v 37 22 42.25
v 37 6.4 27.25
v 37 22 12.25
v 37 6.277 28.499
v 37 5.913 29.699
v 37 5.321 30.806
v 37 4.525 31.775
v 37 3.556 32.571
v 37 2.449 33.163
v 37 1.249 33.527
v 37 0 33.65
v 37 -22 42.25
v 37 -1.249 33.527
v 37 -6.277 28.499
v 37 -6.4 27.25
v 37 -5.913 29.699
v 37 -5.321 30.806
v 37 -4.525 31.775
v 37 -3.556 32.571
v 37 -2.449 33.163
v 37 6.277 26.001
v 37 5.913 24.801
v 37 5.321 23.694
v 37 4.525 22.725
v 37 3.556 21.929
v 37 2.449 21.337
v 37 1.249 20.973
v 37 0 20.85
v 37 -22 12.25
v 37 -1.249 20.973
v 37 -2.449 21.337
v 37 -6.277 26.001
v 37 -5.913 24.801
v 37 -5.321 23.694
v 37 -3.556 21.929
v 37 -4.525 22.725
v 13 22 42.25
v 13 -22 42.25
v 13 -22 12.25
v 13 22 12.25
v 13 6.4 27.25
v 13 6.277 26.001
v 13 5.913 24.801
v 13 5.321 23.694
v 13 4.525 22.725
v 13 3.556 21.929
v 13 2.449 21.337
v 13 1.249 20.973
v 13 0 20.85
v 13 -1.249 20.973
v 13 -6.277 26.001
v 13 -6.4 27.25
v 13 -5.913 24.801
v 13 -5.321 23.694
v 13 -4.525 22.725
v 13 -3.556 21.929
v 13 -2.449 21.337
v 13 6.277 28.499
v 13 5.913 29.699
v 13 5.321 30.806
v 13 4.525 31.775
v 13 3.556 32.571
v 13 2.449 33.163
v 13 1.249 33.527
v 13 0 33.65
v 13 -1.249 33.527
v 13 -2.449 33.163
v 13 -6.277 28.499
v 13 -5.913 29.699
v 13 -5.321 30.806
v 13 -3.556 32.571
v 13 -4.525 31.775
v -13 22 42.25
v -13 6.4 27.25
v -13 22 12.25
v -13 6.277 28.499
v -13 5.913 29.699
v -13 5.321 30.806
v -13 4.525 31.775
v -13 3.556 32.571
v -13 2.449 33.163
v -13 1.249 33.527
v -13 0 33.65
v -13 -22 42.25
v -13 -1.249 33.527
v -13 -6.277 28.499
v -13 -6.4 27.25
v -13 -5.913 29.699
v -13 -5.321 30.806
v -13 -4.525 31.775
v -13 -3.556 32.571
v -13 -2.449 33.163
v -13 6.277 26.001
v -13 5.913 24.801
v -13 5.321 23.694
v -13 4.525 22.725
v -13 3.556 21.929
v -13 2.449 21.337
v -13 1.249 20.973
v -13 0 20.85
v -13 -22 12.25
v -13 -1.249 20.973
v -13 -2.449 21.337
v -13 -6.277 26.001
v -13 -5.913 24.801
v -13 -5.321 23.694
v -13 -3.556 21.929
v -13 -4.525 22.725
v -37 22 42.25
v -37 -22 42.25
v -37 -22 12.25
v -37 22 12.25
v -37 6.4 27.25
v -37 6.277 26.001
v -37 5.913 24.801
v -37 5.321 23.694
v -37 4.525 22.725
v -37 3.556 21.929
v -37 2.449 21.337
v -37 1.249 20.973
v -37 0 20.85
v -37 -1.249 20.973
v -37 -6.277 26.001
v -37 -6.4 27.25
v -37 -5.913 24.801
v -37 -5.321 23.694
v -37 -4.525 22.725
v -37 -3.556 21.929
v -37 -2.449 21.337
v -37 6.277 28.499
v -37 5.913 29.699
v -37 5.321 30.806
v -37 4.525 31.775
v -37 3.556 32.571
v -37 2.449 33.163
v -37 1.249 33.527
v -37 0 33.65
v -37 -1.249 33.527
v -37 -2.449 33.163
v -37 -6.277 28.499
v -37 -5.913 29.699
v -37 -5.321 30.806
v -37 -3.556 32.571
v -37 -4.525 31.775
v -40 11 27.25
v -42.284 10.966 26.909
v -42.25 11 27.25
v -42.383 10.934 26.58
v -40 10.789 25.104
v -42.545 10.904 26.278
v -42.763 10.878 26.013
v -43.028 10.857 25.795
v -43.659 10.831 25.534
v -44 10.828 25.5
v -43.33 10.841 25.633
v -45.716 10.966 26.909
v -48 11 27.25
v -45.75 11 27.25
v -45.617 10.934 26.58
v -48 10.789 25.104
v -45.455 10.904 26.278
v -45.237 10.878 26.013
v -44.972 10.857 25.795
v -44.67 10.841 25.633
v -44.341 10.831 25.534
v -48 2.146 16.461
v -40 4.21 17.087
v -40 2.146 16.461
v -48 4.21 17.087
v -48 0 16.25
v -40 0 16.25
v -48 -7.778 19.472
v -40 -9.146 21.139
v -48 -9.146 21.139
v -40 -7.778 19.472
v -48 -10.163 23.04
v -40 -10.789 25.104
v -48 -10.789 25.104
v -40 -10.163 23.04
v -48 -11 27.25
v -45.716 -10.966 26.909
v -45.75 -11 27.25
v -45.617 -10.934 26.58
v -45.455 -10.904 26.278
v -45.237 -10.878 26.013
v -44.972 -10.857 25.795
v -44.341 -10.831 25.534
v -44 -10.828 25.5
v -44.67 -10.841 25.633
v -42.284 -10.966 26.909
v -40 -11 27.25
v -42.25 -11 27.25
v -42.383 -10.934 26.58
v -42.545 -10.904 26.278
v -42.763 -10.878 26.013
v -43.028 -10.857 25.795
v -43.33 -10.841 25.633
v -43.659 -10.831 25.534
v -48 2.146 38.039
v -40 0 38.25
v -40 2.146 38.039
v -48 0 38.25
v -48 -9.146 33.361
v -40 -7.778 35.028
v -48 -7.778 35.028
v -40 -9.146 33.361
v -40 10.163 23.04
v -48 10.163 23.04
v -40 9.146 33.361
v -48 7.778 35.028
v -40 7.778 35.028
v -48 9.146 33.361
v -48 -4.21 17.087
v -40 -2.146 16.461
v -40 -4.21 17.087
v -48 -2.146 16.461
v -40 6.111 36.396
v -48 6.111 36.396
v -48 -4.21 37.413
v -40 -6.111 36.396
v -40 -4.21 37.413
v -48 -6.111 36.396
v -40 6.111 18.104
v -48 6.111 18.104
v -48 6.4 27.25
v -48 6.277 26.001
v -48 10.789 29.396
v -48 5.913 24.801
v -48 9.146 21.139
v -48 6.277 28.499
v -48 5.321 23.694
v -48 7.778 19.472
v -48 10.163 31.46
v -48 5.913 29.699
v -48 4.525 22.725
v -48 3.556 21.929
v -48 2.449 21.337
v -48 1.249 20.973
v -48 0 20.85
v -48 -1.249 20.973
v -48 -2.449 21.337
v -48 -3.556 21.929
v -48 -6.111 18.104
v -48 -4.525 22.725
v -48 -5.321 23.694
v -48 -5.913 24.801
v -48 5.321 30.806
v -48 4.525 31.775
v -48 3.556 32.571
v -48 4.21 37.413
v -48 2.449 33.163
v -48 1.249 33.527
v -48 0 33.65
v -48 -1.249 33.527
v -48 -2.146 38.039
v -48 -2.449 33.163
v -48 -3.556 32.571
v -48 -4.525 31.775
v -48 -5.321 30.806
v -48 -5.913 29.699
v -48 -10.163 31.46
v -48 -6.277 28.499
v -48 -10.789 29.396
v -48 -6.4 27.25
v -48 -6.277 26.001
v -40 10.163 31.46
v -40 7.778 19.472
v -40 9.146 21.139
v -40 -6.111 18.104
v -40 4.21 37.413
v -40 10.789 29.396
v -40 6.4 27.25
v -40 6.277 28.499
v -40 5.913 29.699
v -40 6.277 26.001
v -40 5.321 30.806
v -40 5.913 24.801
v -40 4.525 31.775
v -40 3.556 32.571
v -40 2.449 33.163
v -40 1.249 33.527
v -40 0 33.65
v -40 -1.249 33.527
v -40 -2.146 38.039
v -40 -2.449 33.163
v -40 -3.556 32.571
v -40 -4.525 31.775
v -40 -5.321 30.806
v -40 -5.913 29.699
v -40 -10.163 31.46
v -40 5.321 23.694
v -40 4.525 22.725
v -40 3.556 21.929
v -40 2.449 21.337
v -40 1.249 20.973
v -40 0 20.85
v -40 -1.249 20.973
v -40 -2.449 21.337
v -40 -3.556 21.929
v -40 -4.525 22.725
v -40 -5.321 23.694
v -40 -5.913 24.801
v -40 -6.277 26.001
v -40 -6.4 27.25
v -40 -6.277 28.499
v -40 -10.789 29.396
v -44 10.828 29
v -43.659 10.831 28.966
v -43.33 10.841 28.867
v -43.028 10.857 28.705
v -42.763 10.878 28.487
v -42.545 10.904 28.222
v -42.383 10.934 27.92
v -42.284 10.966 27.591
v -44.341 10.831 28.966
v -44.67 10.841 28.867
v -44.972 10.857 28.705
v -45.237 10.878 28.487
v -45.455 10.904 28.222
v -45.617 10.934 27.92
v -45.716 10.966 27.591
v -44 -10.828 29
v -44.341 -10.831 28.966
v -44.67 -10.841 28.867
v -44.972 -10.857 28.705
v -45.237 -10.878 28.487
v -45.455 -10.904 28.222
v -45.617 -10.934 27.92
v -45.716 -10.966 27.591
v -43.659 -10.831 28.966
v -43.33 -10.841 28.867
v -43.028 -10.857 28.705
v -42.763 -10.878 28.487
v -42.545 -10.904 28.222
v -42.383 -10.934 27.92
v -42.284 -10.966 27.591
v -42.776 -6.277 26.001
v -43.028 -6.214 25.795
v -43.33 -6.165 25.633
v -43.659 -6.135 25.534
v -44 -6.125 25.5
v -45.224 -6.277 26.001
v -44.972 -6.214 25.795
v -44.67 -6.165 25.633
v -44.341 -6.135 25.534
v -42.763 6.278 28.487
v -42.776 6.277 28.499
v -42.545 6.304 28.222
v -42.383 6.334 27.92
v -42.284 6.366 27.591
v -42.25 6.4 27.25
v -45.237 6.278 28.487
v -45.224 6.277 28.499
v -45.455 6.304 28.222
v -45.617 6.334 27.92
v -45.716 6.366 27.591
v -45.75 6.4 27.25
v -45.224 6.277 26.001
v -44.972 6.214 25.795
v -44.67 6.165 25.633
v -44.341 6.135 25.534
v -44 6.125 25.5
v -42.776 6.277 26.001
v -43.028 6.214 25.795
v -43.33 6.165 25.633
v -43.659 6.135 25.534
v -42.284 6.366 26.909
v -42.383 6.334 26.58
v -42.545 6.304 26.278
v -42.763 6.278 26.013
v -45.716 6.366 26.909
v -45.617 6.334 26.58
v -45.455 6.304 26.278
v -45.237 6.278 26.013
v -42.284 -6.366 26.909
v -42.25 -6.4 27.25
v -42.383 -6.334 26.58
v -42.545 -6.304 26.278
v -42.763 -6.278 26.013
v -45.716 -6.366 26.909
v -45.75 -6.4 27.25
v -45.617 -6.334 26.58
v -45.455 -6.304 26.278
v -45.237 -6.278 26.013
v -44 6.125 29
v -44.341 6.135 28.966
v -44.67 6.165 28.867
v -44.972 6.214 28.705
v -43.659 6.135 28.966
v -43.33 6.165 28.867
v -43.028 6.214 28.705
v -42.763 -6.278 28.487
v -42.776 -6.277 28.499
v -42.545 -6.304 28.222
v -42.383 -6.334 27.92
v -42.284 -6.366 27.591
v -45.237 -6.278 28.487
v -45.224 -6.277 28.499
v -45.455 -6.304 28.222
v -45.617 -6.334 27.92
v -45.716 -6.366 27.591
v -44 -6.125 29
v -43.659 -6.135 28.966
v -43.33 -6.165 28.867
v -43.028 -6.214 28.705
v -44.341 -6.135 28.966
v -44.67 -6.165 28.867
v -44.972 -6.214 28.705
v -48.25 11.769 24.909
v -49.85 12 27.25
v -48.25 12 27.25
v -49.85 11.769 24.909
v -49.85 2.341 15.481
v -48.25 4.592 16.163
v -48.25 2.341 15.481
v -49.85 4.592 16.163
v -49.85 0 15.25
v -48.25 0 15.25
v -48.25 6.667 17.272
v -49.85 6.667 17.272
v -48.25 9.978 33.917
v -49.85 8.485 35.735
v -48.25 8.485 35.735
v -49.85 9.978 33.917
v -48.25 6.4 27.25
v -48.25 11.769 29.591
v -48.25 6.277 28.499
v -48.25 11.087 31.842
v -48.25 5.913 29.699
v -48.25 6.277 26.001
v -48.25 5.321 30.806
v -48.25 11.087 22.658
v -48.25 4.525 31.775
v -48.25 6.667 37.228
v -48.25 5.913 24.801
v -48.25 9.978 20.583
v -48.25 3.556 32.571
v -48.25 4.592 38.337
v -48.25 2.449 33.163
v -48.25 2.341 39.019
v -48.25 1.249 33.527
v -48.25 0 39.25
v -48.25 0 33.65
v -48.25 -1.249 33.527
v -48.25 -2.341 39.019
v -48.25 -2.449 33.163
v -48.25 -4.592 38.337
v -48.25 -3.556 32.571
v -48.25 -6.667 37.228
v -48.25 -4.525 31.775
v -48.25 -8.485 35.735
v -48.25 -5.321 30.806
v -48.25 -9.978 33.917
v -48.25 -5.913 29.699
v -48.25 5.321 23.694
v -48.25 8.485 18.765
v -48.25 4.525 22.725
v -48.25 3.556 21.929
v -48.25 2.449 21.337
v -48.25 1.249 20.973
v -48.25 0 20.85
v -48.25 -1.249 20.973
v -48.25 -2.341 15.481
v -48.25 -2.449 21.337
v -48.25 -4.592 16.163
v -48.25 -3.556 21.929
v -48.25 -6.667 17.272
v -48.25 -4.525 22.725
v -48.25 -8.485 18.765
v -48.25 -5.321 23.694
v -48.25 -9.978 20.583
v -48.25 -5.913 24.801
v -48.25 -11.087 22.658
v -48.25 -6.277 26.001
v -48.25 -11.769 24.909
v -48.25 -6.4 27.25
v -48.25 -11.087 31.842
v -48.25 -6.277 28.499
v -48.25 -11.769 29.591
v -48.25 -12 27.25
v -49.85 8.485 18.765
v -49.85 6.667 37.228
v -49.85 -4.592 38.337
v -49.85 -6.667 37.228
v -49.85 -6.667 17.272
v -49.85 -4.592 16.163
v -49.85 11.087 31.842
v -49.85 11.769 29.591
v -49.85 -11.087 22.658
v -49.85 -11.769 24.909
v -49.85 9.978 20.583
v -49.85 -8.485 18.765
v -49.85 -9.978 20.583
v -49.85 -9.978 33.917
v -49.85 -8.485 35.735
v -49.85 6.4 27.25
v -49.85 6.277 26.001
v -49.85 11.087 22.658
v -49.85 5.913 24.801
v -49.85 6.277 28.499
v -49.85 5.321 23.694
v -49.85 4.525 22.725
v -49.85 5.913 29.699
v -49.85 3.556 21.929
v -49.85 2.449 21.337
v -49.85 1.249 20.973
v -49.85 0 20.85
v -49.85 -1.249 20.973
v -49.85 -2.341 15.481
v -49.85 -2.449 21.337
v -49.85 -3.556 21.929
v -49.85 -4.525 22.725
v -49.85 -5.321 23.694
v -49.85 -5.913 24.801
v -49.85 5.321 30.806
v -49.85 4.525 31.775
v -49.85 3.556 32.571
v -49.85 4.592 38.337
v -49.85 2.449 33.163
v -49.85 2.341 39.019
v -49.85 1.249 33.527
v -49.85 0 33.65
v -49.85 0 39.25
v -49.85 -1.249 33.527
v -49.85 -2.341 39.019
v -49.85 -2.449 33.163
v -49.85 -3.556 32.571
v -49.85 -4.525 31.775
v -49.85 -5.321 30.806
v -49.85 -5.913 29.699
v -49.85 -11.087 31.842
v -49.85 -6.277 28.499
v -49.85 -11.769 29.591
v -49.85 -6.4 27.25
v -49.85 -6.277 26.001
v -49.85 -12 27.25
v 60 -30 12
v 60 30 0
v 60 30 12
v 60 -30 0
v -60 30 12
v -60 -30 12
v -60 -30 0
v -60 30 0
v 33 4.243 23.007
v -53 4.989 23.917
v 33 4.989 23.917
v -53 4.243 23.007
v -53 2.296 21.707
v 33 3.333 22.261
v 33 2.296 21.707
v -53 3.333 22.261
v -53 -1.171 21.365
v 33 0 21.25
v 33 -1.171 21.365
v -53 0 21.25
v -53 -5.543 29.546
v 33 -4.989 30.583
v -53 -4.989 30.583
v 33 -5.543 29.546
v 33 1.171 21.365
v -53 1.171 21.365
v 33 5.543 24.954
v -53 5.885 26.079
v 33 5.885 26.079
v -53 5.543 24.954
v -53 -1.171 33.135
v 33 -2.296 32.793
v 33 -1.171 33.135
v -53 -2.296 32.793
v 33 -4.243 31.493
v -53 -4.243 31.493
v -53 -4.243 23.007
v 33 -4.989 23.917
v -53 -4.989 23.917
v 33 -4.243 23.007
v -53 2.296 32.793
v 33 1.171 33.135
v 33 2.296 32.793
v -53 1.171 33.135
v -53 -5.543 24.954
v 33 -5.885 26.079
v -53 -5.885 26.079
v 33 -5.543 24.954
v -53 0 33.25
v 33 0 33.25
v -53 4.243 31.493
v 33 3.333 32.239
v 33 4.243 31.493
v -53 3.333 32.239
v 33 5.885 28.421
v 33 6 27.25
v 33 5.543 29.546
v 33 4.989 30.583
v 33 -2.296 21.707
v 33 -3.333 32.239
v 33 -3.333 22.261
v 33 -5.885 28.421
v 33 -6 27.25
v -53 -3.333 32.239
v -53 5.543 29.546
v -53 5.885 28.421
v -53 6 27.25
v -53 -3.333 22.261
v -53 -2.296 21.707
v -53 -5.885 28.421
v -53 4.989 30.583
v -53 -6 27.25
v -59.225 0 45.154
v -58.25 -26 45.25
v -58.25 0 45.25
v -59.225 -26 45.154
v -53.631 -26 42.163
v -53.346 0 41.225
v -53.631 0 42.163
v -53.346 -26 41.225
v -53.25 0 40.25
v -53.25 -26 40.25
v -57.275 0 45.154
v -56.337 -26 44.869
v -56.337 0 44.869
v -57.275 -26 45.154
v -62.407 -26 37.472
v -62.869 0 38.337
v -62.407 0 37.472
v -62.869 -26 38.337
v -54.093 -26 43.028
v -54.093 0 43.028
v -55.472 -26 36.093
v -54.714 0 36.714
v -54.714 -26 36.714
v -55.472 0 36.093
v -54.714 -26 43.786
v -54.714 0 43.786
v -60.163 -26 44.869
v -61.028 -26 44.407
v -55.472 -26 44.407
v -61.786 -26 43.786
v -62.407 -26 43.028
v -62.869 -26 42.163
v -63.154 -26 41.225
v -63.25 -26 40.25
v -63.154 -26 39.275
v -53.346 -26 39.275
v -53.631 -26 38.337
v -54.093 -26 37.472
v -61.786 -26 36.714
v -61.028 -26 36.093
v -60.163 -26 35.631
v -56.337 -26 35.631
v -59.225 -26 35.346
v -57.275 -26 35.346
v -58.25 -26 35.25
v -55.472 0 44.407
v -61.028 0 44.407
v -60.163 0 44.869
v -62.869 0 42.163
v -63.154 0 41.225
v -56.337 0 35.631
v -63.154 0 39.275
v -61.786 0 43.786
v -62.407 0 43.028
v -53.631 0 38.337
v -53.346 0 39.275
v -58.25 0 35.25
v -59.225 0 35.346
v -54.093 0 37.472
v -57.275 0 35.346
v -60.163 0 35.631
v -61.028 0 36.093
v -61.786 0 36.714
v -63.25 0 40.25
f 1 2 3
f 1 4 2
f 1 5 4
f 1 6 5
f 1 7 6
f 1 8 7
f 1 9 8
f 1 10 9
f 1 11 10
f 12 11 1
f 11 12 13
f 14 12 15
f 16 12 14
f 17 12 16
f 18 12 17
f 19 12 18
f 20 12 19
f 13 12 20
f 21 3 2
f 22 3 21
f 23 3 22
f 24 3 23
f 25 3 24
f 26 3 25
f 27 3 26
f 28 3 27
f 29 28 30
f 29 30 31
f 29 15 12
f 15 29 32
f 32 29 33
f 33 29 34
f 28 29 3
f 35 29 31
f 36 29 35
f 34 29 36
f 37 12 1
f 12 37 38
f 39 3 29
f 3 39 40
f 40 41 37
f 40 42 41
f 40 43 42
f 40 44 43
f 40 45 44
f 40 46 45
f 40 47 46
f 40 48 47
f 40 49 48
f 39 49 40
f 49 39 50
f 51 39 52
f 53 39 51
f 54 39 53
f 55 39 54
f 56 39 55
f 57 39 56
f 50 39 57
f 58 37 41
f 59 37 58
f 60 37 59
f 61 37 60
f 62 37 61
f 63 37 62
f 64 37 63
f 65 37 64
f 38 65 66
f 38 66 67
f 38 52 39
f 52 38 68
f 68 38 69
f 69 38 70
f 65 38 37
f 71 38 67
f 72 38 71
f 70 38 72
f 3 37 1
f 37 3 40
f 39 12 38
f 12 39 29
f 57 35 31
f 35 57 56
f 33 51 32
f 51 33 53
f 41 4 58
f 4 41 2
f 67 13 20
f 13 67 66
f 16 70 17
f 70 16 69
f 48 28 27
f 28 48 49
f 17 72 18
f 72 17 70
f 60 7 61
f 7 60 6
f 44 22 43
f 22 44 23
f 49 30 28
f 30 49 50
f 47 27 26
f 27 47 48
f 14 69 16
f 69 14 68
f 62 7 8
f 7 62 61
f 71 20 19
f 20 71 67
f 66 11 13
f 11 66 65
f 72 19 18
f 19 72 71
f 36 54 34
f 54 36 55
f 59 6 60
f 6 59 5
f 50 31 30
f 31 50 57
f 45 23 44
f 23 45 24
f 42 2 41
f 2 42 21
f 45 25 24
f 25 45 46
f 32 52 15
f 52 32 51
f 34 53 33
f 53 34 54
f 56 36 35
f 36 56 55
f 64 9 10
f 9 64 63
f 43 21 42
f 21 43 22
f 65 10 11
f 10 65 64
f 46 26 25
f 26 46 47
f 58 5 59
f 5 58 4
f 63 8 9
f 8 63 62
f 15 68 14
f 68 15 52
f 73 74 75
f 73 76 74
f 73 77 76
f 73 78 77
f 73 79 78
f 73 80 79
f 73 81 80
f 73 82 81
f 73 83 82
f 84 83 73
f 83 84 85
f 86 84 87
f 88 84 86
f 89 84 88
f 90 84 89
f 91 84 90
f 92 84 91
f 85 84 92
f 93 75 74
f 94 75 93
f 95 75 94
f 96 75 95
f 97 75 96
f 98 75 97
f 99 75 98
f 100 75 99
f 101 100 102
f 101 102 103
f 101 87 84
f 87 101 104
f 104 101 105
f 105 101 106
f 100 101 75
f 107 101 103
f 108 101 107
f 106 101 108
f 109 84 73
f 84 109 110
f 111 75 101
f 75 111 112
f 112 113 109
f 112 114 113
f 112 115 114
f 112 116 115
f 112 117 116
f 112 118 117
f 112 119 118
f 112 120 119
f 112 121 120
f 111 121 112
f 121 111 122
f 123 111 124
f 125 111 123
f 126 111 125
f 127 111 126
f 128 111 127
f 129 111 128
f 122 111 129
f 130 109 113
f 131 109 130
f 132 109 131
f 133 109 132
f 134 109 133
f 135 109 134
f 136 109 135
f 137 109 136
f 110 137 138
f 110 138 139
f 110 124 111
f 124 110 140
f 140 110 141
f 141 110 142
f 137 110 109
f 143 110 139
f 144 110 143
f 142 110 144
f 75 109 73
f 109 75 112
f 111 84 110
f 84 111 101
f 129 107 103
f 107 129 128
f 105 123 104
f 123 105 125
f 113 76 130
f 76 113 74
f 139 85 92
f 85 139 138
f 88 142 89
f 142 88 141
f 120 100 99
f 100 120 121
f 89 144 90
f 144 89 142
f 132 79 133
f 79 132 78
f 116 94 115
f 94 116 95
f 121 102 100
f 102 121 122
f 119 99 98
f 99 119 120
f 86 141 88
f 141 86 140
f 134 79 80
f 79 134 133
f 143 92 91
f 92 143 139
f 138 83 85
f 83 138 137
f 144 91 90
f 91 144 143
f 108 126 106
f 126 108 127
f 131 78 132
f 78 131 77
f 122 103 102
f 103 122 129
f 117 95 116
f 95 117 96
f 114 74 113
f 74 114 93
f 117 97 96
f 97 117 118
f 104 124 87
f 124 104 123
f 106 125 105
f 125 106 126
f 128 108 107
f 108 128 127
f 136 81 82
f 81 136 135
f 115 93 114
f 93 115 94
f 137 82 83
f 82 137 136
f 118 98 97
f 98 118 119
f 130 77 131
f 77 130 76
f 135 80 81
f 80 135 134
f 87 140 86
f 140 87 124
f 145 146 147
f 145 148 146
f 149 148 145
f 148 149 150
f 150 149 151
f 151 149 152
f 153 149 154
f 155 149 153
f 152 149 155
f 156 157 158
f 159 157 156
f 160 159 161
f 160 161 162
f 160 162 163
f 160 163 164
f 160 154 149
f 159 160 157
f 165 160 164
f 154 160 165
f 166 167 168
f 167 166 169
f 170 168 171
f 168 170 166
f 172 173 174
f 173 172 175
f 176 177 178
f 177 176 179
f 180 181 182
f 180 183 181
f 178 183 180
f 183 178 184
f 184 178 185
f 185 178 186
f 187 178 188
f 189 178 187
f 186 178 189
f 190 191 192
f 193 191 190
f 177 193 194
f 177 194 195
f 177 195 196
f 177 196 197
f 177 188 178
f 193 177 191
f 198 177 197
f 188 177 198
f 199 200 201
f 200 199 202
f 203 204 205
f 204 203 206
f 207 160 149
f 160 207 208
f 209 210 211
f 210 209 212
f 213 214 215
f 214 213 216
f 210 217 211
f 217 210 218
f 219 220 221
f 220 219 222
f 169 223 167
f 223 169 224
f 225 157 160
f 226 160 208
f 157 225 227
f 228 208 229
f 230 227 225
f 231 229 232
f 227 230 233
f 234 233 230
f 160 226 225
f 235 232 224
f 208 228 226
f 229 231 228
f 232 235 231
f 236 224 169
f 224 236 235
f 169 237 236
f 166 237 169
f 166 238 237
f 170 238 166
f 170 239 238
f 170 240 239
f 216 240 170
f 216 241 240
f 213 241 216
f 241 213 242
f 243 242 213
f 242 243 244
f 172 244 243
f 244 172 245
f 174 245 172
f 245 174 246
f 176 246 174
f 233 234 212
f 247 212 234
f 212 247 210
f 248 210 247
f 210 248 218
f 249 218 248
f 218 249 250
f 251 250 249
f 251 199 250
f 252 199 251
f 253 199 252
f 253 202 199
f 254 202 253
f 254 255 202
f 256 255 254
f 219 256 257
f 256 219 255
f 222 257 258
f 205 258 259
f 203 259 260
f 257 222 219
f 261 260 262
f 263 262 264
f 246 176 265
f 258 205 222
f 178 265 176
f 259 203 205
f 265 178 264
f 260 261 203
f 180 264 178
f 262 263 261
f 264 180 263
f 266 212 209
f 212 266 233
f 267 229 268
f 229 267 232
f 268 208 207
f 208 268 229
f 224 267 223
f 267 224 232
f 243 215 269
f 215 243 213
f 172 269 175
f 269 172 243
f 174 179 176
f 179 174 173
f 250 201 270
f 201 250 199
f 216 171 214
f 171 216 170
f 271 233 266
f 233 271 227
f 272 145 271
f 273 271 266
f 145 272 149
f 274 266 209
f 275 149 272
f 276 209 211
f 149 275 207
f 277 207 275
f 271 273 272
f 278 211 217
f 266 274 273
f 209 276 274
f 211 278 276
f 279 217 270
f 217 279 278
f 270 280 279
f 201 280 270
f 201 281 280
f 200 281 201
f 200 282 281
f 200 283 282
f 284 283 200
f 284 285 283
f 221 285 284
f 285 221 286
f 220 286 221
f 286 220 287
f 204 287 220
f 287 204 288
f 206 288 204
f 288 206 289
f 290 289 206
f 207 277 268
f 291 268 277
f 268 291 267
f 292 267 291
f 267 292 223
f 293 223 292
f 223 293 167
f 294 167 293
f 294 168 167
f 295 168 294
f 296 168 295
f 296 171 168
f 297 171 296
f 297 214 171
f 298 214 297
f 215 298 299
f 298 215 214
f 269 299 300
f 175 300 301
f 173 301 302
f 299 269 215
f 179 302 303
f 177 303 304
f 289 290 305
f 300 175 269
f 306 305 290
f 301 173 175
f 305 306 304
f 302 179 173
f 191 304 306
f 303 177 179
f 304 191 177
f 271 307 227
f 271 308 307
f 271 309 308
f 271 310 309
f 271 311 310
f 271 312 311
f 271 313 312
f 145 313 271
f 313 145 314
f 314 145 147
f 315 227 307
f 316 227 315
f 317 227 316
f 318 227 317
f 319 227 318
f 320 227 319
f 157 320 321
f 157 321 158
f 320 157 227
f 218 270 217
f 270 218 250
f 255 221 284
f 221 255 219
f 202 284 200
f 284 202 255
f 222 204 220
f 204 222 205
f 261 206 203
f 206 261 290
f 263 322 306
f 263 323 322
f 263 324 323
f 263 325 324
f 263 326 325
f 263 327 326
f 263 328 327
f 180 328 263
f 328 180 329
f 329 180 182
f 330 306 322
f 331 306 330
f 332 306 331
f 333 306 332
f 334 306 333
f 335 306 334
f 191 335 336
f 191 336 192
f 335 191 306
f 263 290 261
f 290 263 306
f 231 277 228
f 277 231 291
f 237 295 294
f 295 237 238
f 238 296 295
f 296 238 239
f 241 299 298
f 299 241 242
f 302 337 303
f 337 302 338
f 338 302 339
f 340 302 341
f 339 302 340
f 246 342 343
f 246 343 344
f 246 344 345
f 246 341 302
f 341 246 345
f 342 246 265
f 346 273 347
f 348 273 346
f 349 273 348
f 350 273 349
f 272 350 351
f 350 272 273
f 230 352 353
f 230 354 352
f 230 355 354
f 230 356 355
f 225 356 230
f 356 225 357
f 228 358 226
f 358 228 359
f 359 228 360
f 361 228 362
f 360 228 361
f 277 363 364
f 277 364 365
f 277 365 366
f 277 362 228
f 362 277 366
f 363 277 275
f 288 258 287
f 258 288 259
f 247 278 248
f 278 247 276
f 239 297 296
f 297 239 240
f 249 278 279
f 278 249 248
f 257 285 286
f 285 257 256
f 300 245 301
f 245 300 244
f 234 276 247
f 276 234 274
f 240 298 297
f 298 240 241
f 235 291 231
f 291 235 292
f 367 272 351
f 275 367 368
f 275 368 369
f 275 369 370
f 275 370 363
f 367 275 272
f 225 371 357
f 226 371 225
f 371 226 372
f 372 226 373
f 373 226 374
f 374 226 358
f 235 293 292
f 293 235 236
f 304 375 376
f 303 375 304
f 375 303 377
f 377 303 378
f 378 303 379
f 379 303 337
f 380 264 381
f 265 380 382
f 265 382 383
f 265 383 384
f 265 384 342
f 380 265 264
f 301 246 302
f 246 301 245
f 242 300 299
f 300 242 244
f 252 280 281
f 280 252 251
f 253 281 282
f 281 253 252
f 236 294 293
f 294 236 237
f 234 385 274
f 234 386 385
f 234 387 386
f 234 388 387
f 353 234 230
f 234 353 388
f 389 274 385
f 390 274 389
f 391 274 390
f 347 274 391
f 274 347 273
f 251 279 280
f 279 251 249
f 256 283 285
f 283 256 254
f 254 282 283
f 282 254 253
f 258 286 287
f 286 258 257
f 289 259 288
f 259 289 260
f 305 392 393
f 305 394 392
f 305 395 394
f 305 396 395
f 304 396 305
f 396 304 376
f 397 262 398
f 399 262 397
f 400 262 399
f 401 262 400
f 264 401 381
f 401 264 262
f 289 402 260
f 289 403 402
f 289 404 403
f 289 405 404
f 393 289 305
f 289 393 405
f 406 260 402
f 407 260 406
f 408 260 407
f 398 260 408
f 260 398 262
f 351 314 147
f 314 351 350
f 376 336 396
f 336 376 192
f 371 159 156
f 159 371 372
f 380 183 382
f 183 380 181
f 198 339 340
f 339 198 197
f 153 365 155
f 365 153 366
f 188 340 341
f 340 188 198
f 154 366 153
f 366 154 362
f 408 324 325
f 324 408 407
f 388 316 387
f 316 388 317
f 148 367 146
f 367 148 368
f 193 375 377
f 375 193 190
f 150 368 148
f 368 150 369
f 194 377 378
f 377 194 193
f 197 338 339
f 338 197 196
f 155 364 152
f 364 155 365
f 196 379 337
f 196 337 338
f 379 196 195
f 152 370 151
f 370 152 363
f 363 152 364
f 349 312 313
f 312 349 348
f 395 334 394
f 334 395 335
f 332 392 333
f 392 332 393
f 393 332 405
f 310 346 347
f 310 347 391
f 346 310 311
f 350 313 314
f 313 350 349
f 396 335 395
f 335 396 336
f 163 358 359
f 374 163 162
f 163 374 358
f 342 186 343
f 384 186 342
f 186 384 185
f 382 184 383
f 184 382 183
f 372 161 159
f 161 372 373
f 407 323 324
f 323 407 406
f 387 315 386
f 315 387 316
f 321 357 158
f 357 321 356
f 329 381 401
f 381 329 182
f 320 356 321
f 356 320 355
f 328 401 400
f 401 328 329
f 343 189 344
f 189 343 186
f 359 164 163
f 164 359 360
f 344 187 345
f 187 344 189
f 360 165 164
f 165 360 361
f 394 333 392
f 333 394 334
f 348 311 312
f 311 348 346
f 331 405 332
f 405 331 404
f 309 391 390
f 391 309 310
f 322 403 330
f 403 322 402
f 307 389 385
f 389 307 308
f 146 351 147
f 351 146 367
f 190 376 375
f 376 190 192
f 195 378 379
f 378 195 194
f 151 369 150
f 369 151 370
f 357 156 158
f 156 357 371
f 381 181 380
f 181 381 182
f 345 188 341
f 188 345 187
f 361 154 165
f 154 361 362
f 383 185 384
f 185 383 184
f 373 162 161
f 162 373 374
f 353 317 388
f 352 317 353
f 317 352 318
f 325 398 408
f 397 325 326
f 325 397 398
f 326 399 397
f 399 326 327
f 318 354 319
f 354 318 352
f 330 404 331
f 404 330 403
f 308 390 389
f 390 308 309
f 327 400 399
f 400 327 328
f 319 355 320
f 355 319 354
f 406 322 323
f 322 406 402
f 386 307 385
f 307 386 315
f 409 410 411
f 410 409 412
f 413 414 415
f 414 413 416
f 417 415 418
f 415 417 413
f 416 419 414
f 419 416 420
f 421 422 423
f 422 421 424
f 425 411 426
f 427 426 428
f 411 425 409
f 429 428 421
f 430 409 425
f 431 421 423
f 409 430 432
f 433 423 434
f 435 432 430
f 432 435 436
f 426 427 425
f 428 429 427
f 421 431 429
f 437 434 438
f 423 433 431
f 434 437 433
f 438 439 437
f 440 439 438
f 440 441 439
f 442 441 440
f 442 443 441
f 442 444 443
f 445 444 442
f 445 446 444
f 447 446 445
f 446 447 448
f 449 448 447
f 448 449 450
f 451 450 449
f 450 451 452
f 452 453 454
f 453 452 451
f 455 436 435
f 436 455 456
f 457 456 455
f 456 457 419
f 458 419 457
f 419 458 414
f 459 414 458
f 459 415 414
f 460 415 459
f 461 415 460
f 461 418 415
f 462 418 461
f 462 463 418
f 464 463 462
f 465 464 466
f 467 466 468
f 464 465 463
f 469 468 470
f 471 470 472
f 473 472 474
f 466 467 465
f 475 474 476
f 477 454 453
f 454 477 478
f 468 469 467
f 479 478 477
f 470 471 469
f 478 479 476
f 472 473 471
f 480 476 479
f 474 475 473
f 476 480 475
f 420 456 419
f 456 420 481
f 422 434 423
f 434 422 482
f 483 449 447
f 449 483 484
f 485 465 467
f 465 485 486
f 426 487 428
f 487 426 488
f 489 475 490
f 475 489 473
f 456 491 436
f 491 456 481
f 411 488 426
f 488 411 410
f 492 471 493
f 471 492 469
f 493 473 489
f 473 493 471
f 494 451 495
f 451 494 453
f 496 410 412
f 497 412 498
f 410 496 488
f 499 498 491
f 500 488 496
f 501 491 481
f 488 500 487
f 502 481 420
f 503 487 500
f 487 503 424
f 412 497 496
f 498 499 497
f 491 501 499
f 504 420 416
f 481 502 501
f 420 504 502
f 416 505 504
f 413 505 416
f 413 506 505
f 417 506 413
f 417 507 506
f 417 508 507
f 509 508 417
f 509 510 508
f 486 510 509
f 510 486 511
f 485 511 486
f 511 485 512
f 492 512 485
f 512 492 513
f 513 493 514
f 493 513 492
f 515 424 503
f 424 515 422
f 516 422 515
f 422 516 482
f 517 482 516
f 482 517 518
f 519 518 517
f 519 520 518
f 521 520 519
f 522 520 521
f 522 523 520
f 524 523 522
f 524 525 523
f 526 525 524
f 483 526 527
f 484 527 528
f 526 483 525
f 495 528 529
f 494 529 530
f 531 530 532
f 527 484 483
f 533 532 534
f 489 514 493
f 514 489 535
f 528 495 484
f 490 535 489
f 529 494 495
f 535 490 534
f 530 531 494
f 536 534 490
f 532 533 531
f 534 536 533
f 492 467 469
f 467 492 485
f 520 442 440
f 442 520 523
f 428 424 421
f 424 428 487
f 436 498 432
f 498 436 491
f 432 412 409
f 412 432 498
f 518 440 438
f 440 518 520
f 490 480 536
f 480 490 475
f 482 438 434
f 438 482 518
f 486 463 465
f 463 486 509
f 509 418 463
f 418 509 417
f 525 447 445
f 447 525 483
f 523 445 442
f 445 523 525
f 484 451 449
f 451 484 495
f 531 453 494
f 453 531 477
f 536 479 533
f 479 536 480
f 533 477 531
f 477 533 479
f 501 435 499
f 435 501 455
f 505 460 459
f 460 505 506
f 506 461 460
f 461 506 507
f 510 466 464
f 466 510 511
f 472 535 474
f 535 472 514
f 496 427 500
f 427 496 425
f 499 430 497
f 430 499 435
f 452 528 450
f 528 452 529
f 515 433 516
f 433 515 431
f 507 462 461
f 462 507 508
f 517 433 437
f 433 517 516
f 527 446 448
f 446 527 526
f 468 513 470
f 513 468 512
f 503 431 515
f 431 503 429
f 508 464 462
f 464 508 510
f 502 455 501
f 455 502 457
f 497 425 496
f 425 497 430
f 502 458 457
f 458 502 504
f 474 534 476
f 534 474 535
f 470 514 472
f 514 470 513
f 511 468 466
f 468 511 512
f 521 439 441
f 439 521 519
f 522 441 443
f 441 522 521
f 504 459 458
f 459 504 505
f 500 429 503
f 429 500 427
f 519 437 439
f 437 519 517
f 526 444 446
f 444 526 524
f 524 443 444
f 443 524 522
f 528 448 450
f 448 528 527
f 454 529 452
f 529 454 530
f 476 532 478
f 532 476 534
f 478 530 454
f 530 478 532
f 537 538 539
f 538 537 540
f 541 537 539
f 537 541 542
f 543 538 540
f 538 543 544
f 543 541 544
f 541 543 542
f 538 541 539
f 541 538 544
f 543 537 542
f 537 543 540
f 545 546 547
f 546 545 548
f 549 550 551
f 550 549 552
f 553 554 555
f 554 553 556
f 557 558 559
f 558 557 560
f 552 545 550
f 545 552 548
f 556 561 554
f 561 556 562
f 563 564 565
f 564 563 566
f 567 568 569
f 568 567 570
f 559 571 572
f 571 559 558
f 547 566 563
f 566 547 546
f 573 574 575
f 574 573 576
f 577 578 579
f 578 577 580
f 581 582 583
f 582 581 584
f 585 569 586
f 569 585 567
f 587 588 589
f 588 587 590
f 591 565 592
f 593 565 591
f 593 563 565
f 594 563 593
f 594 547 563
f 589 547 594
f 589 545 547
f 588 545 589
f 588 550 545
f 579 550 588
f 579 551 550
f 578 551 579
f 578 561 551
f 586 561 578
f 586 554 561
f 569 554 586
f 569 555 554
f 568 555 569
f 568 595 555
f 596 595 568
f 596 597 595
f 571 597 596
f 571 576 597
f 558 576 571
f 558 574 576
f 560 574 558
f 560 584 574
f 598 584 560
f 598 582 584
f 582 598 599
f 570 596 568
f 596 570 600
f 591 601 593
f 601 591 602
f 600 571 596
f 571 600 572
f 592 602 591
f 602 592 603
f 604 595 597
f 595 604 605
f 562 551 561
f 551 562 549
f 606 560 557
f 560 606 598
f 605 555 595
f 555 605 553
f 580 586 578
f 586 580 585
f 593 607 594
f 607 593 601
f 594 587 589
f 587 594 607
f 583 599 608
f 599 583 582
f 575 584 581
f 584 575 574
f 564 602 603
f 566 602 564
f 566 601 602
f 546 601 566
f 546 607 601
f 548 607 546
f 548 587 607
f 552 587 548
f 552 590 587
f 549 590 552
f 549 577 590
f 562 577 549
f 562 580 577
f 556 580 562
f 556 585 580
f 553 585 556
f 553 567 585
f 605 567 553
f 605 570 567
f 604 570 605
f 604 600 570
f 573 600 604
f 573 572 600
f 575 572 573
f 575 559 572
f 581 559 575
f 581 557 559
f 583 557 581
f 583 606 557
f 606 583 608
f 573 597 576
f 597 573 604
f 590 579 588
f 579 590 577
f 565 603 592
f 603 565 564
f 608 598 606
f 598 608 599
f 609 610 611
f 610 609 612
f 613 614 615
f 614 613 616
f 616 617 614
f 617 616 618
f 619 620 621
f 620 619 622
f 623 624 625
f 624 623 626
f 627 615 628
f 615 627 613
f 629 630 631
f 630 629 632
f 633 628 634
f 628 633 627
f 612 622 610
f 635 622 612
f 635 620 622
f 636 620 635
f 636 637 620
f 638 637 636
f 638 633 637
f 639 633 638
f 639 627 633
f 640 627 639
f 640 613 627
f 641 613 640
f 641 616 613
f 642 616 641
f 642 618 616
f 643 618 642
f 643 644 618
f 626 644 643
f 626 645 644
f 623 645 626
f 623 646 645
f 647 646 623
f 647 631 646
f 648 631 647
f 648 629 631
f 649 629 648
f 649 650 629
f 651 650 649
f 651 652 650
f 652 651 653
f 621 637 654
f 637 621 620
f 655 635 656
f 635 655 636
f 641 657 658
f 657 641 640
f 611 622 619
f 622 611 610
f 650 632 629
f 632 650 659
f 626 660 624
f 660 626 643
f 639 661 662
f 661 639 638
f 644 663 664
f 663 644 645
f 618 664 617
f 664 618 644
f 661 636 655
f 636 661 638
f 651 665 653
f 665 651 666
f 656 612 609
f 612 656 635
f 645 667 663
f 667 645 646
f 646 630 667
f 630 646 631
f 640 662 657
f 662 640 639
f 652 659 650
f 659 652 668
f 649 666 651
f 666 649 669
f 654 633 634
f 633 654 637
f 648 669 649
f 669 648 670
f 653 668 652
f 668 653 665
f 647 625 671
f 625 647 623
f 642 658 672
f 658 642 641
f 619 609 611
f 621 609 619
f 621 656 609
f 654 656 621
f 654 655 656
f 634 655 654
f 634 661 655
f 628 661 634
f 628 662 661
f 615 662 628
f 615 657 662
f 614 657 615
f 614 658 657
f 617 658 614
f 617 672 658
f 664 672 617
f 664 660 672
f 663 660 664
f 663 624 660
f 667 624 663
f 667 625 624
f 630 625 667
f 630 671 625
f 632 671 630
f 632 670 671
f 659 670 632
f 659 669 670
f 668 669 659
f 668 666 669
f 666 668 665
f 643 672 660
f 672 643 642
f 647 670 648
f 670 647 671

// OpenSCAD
$fn = 32;

// ------------------------------------------------------------------------
// Machine vise: screw d12, jaws 24 x 30 mm
// Every part is its own module, assembly() places every instance.
// ------------------------------------------------------------------------

// --- part 1 ---
module vise_bed() {
  difference() {
    translate([-60, -30, 0]) cube([120, 60, 12]);
  }
}

// --- part 2 ---
module vise_jaw() {
  difference() {
    translate([-12, -22, 0]) cube([24, 44, 30]);
    translate([0, 0, 15]) rotate([0, 90, 0]) cylinder(h = 26, d = 12.8, center = true);
  }
}

// --- part 3 ---
module vise_screw() {
  translate([0, 0, -43]) cylinder(h = 86, d = 12);
}

// --- part 4 ---
module screw_collar() {
  difference() {
    cylinder(h = 8, d = 22);
    translate([0, 0, -1]) cylinder(h = 10, d = 12.8);
    translate([0, 0, 4]) rotate([90, 0, 0]) cylinder(h = 24, d = 3.5, center = true);
  }
}

// --- part 5 ---
module screw_washer() {
  difference() {
      translate([0, 0, 0]) cylinder(h = 1.6, d = 24);
      translate([0, 0, -1]) cylinder(h = 3.6, d = 12.8);
    }
}

// --- part 6 ---
module vise_handle() {
  cylinder(h = 26, d = 10);
}

// --- assembly ---
module assembly() {
  color([0.80, 0.24, 0.20]) translate([0, 0, 0]) rotate([0, 0, 0]) vise_bed();
  color([0.20, 0.45, 0.75]) translate([25, 0, 12.25]) rotate([0, 0, 0]) vise_jaw();
  color([0.25, 0.62, 0.32]) translate([-25, 0, 12.25]) rotate([0, 0, 0]) vise_jaw();
  color([0.92, 0.70, 0.18]) translate([-10, 0, 27.25]) rotate([0, 90, 0]) vise_screw();
  color([0.58, 0.35, 0.70]) translate([-48, 0, 27.25]) rotate([0, 90, 0]) screw_collar();
  color([0.16, 0.66, 0.66]) translate([-49.85, 0, 27.25]) rotate([0, 90, 0]) screw_washer();
  color([0.85, 0.48, 0.18]) translate([-58.25, 0, 40.25]) rotate([90, 0, 0]) vise_handle();
}

assembly();
